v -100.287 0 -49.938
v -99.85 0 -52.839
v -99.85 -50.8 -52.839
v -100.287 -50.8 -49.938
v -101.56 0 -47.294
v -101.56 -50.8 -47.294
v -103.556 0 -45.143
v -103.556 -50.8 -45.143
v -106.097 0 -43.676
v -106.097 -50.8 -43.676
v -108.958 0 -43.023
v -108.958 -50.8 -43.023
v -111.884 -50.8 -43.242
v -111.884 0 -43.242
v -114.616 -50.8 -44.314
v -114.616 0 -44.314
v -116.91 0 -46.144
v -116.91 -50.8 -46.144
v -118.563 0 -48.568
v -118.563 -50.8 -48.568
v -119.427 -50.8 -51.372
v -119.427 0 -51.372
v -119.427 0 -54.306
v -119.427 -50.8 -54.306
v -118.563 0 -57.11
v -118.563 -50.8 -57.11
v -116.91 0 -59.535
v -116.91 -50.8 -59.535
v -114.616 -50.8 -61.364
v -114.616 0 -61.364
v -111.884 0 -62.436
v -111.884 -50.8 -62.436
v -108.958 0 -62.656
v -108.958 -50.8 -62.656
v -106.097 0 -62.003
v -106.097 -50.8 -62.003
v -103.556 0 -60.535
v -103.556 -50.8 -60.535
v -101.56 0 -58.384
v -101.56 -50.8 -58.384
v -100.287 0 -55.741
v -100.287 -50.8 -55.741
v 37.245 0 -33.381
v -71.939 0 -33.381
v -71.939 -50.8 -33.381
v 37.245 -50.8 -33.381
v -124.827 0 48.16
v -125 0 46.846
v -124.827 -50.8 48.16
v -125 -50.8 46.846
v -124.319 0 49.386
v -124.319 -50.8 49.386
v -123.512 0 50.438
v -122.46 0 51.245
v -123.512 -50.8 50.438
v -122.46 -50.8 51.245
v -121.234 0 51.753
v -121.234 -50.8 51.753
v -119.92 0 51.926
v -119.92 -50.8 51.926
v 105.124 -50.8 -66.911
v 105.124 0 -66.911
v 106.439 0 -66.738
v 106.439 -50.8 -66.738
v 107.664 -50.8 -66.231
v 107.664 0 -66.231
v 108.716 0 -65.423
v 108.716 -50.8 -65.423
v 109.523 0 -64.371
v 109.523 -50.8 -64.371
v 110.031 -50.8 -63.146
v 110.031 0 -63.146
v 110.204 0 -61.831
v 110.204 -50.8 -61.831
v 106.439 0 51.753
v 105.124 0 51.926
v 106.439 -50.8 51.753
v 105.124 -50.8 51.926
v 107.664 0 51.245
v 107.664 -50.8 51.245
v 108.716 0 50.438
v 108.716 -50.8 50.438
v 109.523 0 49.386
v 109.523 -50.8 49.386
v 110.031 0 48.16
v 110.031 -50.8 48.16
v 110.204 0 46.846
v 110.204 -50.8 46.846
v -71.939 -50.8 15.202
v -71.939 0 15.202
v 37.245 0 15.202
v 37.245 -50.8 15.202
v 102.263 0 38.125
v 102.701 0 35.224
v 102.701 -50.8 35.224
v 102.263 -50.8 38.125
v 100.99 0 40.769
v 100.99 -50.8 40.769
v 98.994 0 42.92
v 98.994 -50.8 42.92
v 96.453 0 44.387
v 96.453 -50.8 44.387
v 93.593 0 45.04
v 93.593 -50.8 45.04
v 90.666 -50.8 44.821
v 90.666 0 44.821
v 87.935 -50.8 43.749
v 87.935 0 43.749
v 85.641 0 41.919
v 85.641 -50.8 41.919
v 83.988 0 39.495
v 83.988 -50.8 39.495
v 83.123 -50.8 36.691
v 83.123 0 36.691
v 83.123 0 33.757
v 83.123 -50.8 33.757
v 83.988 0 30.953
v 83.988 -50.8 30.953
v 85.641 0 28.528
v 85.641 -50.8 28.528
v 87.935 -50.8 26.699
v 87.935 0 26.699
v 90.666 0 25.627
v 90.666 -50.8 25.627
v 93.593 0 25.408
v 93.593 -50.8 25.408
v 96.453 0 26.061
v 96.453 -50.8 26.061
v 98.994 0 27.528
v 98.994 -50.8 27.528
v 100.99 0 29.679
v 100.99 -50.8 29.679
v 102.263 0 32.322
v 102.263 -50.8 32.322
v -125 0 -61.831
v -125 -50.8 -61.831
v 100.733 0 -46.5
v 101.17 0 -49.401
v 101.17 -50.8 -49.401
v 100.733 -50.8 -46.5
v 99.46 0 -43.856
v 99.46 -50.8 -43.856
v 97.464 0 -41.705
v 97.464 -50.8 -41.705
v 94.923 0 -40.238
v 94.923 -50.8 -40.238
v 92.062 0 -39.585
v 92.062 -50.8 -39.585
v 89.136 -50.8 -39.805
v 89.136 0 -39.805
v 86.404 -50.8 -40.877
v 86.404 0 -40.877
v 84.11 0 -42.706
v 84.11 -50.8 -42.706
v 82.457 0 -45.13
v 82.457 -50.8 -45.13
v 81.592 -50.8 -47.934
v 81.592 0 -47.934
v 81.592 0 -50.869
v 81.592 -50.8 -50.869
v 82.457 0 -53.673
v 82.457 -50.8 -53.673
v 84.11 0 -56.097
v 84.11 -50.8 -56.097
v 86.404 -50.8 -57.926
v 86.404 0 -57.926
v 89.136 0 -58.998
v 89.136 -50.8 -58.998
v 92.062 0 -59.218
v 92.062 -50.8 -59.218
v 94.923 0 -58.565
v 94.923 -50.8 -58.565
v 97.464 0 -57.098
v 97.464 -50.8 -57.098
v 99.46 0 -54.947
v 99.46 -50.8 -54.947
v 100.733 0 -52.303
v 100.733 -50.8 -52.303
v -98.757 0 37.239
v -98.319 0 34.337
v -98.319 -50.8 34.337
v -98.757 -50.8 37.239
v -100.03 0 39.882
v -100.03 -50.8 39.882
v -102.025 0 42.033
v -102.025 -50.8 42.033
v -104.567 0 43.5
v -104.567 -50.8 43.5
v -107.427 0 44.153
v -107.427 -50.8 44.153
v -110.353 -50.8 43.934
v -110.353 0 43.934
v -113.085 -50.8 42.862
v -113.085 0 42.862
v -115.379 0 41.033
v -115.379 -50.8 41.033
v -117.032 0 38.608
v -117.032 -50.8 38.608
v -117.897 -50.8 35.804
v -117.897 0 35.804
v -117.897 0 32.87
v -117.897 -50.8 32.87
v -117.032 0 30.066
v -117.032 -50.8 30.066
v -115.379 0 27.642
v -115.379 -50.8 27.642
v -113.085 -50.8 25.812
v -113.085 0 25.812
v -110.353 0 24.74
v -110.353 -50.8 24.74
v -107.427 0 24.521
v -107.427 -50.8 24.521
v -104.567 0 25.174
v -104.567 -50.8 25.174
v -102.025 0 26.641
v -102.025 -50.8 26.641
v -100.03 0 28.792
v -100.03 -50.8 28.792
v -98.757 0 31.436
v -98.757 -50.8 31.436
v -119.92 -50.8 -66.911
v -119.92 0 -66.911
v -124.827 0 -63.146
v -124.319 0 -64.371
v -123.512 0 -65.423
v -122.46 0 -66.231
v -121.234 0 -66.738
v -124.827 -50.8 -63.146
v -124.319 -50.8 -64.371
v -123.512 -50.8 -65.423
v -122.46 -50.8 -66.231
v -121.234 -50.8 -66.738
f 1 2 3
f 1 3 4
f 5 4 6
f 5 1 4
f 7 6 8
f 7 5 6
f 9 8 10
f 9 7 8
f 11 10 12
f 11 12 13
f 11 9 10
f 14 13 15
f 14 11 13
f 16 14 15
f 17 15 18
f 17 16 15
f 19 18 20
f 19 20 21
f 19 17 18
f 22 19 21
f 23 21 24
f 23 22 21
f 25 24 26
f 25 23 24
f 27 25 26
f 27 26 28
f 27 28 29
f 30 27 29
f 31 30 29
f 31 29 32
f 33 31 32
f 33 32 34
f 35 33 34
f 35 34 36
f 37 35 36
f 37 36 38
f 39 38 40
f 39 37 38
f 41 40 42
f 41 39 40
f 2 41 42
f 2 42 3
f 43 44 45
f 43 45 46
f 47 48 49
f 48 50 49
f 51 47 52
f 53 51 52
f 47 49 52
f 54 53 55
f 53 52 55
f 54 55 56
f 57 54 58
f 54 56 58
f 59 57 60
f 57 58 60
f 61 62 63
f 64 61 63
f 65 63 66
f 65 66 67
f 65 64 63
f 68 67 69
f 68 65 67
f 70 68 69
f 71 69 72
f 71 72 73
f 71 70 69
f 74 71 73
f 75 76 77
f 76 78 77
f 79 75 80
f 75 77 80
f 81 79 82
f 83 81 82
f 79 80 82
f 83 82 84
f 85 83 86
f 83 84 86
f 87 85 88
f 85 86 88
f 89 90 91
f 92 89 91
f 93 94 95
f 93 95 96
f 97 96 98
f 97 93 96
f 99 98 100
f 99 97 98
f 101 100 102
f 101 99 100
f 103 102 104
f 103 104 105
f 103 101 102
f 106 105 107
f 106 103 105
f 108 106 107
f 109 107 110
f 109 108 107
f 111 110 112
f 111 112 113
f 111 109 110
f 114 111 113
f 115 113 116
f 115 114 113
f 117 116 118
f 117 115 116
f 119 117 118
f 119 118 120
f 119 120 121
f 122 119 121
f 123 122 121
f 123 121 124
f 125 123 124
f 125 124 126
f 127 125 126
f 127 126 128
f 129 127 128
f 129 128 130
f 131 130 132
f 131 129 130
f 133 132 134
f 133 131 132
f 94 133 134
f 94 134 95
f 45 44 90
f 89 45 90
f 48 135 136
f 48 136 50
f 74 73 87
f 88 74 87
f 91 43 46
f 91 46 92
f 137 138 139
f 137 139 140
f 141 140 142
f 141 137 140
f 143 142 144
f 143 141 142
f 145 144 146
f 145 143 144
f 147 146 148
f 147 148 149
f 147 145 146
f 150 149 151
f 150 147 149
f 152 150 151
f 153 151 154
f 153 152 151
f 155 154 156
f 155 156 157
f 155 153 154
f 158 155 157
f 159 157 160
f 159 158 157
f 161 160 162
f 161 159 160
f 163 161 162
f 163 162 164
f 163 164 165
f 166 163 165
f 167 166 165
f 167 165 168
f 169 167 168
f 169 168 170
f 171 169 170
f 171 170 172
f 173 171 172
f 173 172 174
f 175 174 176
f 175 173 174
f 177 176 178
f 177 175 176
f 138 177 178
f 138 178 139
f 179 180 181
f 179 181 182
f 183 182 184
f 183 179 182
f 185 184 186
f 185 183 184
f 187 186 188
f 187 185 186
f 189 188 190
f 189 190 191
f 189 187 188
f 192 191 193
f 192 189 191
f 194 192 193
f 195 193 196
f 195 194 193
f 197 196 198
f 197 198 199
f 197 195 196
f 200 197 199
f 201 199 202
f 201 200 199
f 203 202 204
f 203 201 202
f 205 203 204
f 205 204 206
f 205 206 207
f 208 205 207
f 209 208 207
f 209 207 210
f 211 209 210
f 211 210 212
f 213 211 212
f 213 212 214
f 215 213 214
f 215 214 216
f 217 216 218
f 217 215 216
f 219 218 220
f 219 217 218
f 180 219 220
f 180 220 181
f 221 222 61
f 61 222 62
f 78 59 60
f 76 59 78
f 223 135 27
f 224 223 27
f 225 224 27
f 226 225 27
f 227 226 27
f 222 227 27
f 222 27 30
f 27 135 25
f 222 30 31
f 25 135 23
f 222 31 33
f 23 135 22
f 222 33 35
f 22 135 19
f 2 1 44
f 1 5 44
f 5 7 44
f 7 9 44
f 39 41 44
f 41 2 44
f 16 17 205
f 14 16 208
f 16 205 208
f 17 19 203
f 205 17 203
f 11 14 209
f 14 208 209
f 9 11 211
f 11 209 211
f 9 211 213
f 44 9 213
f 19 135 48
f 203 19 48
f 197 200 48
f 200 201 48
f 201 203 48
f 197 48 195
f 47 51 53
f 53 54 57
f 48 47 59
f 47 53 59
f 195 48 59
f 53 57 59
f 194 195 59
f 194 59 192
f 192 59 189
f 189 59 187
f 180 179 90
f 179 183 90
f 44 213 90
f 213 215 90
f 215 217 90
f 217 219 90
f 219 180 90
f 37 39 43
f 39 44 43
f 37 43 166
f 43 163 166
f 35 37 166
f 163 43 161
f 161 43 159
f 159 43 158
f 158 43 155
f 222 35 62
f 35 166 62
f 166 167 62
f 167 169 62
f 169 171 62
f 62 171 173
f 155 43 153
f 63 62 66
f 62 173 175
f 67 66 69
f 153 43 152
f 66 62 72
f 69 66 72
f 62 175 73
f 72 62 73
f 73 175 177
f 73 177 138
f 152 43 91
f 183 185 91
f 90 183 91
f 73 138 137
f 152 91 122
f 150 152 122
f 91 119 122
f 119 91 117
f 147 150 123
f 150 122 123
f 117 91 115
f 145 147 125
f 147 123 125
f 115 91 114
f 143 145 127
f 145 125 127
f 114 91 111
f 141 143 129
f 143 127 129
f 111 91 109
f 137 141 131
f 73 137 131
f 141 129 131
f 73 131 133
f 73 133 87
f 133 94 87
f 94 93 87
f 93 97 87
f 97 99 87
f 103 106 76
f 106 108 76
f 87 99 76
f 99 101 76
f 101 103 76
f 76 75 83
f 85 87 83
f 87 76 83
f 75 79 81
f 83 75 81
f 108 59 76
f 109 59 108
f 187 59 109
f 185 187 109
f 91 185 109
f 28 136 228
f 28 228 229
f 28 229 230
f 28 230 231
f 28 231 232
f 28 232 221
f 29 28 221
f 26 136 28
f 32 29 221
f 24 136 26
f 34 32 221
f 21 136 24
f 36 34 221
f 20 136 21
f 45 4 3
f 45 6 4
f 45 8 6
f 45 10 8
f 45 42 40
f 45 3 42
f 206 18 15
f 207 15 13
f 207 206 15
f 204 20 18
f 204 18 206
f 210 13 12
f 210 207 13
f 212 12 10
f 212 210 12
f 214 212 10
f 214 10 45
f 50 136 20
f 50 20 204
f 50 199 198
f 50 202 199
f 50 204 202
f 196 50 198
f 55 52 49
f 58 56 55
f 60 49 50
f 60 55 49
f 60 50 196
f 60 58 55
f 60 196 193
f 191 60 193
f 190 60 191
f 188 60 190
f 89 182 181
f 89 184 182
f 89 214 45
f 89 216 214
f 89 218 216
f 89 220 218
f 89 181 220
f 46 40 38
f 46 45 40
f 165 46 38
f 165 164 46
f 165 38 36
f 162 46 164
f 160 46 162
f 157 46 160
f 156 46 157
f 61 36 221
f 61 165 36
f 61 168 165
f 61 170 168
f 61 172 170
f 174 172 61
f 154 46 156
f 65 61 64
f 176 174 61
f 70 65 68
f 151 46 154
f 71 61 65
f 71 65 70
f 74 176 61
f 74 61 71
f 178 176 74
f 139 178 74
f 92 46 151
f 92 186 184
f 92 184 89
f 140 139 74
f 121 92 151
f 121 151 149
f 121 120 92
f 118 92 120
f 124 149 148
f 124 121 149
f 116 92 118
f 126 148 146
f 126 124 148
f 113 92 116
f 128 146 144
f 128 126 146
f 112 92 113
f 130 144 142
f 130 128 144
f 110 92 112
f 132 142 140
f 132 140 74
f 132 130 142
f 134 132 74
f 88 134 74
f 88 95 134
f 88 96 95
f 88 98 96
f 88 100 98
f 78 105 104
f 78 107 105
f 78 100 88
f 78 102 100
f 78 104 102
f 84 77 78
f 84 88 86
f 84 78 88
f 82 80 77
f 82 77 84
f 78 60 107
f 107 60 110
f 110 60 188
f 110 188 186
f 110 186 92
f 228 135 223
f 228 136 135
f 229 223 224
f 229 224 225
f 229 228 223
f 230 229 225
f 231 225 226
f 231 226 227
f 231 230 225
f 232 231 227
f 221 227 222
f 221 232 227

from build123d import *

# Parameters (mm, degrees)
F0_W     = 235.203512
F0_H     = 118.836838
F0_R     = 9.843794
F0_W_2   = 109.183416
F0_H_2   = 48.583305
F1_DEPTH = 50.8
F2_R     = 5.08
F3_R     = 5.08
F4_R     = 5.08


with BuildPart() as f1:
    # F0 (on Front) → F1 (new body)
    with BuildSketch(Plane.XZ):
        with Locations((-7.397939, -7.492734)):
            Rectangle(F0_W, F0_H)
        with Locations((-109.693609, -52.839234)):
            Circle(F0_R, mode=Mode.SUBTRACT)
        with Locations((-17.346896, -9.089239)):
            Rectangle(F0_W_2, F0_H_2, mode=Mode.SUBTRACT)
        with Locations((91.326304, -49.401499)):
            Circle(F0_R, mode=Mode.SUBTRACT)
        with Locations((-108.162999, 34.3371)):
            Circle(F0_R, mode=Mode.SUBTRACT)
        with Locations((92.856914, 35.22383)):
            Circle(F0_R, mode=Mode.SUBTRACT)
    extrude(amount=F1_DEPTH)

    # F2
    f2_edges = [f1.edges().sort_by_distance(p)[0] for p in [
        (110.203817, -25.4, -66.911153),
        (-124.999695, -25.4, -66.911153),
    ]]
    fillet(f2_edges, radius=F2_R)

    # F3
    f3_edges = [f1.edges().sort_by_distance(p)[0] for p in [
        (-124.999695, -25.4, 51.925685),
    ]]
    fillet(f3_edges, radius=F3_R)

    # F4
    f4_edges = [f1.edges().sort_by_distance(p)[0] for p in [
        (110.203817, -25.4, 51.925685),
    ]]
    fillet(f4_edges, radius=F4_R)


solid = f1.part
